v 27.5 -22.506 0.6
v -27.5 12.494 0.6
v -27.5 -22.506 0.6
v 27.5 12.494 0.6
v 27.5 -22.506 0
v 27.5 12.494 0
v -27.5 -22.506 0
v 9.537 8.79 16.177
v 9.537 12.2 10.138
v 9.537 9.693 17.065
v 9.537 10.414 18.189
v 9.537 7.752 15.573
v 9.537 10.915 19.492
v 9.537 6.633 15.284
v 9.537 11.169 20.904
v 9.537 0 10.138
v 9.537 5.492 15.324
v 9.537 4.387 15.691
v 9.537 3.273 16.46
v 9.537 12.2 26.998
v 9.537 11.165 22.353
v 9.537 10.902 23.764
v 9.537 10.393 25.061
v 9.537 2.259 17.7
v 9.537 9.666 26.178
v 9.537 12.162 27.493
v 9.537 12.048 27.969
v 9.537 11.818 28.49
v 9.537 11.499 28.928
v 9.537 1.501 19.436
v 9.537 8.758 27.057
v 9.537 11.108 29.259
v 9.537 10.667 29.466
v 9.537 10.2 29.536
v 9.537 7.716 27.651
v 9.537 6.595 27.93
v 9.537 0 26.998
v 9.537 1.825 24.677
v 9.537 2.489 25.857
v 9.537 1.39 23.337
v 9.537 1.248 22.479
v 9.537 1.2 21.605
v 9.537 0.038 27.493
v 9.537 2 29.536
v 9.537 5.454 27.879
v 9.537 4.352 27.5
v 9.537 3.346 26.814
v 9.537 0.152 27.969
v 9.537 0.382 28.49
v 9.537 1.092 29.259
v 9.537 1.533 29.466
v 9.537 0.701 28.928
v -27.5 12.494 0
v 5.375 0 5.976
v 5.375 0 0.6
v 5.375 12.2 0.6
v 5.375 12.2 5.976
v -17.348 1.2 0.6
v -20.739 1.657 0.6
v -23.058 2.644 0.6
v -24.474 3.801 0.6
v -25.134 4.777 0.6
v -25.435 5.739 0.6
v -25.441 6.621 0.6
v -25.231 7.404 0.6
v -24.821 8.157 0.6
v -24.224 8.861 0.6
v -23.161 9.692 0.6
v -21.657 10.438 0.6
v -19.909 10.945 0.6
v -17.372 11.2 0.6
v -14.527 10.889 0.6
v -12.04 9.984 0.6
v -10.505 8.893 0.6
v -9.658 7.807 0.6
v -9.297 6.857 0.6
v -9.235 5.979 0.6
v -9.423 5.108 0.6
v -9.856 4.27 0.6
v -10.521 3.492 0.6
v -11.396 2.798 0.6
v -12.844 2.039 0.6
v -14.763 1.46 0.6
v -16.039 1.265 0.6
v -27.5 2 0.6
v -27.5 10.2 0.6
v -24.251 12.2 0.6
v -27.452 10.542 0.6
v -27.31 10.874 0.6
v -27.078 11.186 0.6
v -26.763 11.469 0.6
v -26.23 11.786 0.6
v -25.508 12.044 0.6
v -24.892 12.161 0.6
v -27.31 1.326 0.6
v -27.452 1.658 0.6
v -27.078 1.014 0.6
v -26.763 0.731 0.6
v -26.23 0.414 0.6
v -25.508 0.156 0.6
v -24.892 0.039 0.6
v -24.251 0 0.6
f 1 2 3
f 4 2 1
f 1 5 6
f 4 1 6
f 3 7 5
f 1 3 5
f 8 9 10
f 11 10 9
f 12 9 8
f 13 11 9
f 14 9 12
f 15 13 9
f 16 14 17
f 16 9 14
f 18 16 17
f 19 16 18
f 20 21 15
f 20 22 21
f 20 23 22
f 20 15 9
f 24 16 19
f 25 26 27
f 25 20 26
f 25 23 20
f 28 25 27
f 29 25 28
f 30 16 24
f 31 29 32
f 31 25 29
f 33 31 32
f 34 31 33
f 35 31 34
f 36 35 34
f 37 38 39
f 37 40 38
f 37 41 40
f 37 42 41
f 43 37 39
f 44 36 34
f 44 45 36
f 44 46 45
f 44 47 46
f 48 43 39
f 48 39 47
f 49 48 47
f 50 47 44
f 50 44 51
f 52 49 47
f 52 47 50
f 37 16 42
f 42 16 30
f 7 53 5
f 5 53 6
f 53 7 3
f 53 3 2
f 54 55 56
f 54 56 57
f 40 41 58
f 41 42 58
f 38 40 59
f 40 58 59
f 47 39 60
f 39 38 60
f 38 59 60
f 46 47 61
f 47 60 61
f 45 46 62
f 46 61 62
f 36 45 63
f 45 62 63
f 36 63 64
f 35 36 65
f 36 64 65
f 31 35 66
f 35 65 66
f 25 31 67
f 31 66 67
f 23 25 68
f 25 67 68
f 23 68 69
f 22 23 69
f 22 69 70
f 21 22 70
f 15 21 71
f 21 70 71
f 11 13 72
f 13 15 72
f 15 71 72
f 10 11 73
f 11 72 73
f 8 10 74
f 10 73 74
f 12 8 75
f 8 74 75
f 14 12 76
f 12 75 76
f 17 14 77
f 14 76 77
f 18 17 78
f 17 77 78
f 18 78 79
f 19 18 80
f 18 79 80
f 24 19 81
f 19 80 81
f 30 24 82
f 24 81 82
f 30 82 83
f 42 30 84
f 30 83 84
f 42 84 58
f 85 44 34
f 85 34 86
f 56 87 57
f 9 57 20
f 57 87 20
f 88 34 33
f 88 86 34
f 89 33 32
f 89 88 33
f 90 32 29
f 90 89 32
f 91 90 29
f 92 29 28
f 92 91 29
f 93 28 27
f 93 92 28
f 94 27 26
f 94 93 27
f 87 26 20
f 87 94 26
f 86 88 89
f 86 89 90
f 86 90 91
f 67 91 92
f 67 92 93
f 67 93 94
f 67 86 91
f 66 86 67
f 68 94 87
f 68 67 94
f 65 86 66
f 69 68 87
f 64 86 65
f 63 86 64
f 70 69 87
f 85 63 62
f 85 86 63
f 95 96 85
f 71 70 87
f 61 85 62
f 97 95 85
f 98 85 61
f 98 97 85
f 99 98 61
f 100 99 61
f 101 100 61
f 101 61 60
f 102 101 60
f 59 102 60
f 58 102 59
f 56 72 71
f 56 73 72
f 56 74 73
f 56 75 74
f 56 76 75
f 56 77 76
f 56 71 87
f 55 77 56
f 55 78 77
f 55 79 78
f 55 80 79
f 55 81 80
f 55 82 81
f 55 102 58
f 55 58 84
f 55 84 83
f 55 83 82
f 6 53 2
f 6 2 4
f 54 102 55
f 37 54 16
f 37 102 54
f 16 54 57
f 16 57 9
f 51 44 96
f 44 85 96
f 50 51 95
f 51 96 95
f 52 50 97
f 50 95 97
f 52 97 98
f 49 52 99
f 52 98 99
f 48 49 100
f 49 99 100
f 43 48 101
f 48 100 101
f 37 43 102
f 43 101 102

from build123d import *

# Parameters (mm, degrees)
F0_W     = 55
F0_H     = 35
F1_DEPTH = 0.6
F3_DEPTH = 12.2
F5_R     = 5
F6_DEPTH = 80
F9_R     = 2


with BuildPart() as f1:
    # F0 (on Top) → F1 (new body)
    with BuildSketch(Plane.XY):
        with Locations((0, -5.0058960915)):
            Rectangle(F0_W, F0_H)
    extrude(amount=F1_DEPTH)


with BuildPart() as f3:
    # F2 (on Front) → F3 (new body)
    with BuildSketch(Plane.XZ):
        Polygon((9.5365054195, 29.5360893403), (-27.5, 0.6), (5.3746255518, 0.6), (5.3746255518, 5.9764396758), (9.5365054195, 10.1383195435), align=None)
    extrude(amount=-F3_DEPTH)


with BuildPart() as f6:
    # F5 (on face) → F6 (new body, symmetric)
    with BuildSketch(Plane(origin=(10.780920551, 0, 8.422978267), x_dir=(0, -1, 0), z_dir=(-0.7880107536, 0, -0.6156614753))):
        with Locations((0, 11.1534970236)):
            Circle(F5_R)
    extrude(amount=F6_DEPTH, both=True)


with BuildPart() as f6_1:
    # F7: moved
    add(f6.part.moved(Location((0, 6.2, 0))))


with BuildPart() as f3_1:
    add(f3.part)

    # F8: cut F6
    add(f6_1.part, mode=Mode.SUBTRACT)

    # F9
    f9_edges = [f3_1.edges().sort_by_distance(p)[0] for p in [
        (-8.981747, 12.2, 15.068045),
        (-8.981747, 0, 15.068045),
    ]]
    fillet(f9_edges, radius=F9_R)


solid = Compound([f1.part, f3_1.part])
